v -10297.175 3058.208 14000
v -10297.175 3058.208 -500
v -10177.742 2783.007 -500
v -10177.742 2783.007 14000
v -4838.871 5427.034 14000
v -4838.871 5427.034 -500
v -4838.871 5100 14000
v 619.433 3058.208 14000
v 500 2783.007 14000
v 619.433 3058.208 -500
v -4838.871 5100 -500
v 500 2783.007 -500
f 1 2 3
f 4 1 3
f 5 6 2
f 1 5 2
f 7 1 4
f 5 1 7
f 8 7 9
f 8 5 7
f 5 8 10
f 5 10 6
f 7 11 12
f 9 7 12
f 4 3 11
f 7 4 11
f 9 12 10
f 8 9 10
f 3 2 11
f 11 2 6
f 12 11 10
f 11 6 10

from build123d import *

# Parameters (mm, degrees)
EXTRUDE_1_DEPTH      = 14000
EXTRUDE_1_DEPTH_BACK = 500


with BuildPart() as part:
    # Эскиз1 → Бобышка-Вытянуть1 (new, two sides: drawn at the far end of the back side and taken through both)
    with BuildSketch(Plane.XY.offset(-EXTRUDE_1_DEPTH_BACK)):
        Polygon((-10177.741577619, 2783.007225068), (-4838.87078881, 5100), (500, 2783.007225068), (619.433328071, 3058.208388122), (-4838.87078881, 5427.033501608), (-10297.17490569, 3058.208388122), align=None)
    extrude(amount=EXTRUDE_1_DEPTH + EXTRUDE_1_DEPTH_BACK)


solid = part.part
